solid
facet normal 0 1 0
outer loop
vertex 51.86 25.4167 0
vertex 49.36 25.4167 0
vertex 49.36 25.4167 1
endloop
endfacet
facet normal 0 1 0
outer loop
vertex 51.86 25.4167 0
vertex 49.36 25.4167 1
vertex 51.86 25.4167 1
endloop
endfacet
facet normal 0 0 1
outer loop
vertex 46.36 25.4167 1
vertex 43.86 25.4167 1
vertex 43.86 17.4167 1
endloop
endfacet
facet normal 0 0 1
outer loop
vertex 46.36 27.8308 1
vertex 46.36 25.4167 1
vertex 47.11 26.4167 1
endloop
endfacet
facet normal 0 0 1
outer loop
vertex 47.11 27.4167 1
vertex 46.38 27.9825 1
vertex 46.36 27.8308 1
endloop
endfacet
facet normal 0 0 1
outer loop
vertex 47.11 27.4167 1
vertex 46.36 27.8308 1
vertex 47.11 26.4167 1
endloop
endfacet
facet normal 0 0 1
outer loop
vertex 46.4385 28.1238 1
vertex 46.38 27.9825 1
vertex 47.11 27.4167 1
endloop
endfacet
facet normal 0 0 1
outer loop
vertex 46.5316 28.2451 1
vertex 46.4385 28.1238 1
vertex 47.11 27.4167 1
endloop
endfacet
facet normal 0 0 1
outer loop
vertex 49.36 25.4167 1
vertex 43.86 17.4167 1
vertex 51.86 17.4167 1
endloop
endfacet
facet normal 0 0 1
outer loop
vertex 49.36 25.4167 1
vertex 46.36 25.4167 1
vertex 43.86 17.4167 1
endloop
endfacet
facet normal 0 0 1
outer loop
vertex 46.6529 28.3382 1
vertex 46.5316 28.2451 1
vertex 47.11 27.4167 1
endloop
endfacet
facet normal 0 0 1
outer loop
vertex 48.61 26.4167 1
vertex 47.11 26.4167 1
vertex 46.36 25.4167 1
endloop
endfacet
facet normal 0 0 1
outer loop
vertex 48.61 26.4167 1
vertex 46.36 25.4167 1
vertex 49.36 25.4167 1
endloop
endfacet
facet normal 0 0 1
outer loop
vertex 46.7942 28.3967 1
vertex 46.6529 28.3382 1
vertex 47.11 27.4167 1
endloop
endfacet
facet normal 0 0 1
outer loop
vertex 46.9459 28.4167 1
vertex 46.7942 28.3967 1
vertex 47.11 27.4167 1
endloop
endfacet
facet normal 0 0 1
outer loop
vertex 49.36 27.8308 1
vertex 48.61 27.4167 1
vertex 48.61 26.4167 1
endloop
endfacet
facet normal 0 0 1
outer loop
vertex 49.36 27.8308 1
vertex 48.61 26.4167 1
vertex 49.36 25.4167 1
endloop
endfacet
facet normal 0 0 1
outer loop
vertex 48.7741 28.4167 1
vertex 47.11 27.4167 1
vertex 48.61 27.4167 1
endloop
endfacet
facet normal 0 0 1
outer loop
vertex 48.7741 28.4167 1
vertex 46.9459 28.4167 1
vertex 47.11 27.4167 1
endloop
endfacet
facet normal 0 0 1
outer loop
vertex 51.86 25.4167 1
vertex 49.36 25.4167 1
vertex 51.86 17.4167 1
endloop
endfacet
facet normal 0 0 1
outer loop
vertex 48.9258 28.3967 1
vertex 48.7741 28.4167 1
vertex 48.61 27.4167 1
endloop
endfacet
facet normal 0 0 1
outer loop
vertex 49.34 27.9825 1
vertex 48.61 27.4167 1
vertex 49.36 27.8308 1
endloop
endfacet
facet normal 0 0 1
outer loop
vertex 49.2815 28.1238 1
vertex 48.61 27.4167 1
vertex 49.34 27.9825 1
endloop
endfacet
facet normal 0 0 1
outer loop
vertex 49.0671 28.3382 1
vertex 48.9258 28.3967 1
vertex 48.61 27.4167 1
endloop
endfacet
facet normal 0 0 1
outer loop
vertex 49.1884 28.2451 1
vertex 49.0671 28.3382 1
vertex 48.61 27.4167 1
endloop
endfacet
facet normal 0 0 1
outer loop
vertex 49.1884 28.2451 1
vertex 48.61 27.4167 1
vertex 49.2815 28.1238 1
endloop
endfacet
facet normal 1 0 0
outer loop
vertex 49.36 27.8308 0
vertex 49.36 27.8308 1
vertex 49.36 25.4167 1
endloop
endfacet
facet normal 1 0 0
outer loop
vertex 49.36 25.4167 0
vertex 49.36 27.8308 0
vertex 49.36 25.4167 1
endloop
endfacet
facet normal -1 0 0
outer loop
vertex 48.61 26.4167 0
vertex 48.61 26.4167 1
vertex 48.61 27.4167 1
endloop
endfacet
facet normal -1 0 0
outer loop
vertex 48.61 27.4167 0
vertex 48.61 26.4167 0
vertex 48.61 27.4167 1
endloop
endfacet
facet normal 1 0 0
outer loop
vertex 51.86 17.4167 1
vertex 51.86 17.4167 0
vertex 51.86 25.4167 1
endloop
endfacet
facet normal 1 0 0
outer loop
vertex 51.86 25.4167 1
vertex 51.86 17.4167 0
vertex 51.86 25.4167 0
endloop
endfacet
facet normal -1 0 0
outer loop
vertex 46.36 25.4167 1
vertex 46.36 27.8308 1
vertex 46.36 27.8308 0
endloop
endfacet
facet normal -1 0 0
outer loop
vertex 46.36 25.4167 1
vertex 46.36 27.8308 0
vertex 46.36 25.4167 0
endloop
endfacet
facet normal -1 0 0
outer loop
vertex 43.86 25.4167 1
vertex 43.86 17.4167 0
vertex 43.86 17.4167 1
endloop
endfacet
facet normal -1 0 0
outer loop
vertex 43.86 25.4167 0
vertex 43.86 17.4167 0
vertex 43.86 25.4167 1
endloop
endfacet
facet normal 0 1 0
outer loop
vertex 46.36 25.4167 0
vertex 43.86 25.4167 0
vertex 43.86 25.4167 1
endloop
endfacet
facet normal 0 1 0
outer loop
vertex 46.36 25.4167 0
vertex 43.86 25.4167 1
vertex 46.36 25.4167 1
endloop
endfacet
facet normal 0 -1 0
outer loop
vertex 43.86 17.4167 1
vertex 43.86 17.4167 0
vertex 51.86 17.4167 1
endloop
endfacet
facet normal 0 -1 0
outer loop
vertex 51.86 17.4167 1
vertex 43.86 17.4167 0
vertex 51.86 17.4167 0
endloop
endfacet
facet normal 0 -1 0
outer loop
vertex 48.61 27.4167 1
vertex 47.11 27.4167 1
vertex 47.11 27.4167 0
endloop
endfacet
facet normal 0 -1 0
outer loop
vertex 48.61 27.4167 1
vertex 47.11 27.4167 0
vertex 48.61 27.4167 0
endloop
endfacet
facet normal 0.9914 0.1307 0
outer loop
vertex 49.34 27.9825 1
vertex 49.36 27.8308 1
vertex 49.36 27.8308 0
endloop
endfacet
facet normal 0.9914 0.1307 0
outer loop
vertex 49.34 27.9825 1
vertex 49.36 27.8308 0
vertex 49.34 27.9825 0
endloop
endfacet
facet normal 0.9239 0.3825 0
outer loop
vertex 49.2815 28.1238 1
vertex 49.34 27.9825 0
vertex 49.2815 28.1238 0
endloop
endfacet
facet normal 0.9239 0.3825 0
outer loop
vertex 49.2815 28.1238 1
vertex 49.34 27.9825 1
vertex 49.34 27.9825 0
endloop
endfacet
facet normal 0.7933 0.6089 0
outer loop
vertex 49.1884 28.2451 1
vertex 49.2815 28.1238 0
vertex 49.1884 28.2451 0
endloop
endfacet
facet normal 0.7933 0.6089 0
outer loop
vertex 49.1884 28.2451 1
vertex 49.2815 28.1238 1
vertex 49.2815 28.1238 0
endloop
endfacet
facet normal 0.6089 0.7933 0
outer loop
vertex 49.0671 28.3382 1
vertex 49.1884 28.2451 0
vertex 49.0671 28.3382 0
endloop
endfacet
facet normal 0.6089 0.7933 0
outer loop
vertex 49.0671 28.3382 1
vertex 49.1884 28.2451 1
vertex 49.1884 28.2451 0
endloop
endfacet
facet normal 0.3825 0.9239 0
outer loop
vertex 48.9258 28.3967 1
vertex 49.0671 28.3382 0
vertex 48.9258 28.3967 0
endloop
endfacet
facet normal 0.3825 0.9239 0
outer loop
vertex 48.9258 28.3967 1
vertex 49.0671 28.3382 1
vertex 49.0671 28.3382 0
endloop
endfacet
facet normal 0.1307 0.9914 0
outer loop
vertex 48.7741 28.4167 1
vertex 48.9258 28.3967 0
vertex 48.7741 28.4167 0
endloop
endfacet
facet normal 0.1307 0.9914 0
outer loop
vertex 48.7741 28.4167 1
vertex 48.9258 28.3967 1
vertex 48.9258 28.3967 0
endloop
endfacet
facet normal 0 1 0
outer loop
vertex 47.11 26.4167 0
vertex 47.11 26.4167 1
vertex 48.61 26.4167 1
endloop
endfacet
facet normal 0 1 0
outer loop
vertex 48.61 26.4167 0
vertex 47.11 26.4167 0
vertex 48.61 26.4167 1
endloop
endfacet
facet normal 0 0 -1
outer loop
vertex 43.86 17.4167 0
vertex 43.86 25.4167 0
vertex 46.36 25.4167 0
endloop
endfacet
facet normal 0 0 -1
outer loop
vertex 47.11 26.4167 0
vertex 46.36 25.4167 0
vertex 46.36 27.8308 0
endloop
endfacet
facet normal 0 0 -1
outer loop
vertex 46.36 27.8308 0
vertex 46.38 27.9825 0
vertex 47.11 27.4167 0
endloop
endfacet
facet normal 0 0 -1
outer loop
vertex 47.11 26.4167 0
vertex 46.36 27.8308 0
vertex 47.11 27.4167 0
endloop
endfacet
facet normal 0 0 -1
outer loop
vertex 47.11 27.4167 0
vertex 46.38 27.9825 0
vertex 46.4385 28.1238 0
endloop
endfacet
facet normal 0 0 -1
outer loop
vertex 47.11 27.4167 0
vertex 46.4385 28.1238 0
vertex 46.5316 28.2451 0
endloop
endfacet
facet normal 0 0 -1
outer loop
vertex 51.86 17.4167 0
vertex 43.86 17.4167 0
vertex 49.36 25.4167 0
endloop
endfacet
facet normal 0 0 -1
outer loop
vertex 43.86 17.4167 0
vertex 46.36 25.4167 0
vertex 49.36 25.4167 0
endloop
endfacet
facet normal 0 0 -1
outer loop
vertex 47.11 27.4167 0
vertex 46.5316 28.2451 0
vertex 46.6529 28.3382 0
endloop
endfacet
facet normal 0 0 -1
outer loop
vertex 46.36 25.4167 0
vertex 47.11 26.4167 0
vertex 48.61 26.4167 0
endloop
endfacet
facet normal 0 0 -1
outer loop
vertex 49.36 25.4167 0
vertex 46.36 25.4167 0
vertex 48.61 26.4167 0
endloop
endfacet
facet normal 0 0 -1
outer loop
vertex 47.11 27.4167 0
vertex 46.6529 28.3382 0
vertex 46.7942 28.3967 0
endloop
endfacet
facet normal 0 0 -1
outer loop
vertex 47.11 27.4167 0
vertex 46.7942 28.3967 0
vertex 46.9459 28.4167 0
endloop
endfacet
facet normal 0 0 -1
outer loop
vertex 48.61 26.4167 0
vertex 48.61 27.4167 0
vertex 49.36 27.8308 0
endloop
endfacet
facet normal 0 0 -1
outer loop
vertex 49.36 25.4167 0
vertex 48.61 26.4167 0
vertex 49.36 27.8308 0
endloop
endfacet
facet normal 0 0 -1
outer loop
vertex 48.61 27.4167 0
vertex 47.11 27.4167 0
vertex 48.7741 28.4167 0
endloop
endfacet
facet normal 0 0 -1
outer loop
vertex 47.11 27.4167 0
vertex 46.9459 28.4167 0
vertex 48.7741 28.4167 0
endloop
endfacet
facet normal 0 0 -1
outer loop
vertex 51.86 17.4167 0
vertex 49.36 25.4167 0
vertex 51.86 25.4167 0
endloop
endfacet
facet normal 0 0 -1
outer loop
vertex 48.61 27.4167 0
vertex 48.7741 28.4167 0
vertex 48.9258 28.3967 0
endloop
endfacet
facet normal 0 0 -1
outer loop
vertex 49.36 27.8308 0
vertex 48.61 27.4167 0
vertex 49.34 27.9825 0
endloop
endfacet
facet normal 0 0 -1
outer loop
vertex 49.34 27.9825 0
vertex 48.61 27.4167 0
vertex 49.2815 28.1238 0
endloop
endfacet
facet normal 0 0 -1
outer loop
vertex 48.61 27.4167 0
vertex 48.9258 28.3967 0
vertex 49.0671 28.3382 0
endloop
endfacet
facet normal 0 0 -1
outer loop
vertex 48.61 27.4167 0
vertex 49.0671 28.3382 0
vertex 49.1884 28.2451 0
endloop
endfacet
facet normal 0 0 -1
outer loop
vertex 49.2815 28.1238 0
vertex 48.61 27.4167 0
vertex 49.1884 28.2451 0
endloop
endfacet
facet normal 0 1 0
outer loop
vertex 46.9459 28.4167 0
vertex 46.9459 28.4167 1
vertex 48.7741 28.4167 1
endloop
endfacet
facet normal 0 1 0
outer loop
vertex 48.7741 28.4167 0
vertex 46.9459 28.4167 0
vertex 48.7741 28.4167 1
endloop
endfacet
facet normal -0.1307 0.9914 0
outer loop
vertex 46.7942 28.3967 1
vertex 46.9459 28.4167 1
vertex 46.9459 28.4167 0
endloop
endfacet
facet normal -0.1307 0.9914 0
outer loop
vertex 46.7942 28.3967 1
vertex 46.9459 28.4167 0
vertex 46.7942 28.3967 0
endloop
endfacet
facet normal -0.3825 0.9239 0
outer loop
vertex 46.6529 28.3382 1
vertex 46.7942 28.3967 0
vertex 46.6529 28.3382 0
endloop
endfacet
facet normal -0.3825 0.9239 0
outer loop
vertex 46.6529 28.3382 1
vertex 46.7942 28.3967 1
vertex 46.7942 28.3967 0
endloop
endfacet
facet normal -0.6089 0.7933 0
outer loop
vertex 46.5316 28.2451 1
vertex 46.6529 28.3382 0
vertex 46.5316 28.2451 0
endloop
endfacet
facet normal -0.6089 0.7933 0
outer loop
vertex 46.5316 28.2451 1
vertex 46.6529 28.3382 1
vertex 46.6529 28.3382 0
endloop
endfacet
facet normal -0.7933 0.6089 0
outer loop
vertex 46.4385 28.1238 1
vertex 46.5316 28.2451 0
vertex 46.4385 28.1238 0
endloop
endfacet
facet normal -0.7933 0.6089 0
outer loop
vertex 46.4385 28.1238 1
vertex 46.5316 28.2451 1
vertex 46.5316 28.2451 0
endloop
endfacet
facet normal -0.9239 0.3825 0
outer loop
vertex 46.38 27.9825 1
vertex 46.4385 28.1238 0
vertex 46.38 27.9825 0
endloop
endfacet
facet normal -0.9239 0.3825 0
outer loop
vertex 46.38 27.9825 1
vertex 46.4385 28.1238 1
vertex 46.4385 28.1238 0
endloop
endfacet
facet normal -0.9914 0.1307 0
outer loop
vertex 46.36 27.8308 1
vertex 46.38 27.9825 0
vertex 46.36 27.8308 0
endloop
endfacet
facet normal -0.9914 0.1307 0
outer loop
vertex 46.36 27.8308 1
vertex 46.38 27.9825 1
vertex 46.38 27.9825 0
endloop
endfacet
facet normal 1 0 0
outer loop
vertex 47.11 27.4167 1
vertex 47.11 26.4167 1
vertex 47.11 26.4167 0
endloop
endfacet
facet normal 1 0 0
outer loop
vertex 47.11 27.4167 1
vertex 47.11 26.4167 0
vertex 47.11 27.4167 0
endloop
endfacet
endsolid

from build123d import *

# Parameters (mm, degrees)
SKETCH007_W      = 1.5
SKETCH007_H      = 1
EXTRUDE008_DEPTH = 1
BOX004_W         = 8
BOX004_H         = 8
BOX004_DEPTH     = 1


with BuildPart() as wedgeextrude:
    # Sketch007 (on Face6 of Box004) → Extrude008 (new body)
    with BuildSketch(Plane(origin=(43.86, 17.4167, 1), x_dir=(1, 0, 0), z_dir=(0, 0, 1))):
        with BuildLine():
            Line((5.5, 8), (2.5, 8))
            Line((2.5, 10.414147), (2.5, 8))
            ThreePointArc((3.085853, 11), (2.671592, 10.828408), (2.5, 10.414147))
            Line((3.085853, 11), (4.914147, 11))
            ThreePointArc((5.5, 10.414147), (5.328408, 10.828408), (4.914147, 11))
            Line((5.5, 10.414147), (5.5, 8))
        make_face()
        with Locations((4, 9.5)):
            Rectangle(SKETCH007_W, SKETCH007_H, mode=Mode.SUBTRACT)
    extrude(amount=-EXTRUDE008_DEPTH)


with BuildPart() as wedgewedge:
    # Box004 → Box004 (new body)
    with BuildSketch(Plane(origin=(43.86, 17.4167, 0), x_dir=(1, 0, 0), z_dir=(0, 0, 1))):
        with Locations((4, 4)):
            Rectangle(BOX004_W, BOX004_H)
    extrude(amount=BOX004_DEPTH)

    # Fusion001: union wedgeExtrude
    add(wedgeextrude.part)


solid = wedgewedge.part
